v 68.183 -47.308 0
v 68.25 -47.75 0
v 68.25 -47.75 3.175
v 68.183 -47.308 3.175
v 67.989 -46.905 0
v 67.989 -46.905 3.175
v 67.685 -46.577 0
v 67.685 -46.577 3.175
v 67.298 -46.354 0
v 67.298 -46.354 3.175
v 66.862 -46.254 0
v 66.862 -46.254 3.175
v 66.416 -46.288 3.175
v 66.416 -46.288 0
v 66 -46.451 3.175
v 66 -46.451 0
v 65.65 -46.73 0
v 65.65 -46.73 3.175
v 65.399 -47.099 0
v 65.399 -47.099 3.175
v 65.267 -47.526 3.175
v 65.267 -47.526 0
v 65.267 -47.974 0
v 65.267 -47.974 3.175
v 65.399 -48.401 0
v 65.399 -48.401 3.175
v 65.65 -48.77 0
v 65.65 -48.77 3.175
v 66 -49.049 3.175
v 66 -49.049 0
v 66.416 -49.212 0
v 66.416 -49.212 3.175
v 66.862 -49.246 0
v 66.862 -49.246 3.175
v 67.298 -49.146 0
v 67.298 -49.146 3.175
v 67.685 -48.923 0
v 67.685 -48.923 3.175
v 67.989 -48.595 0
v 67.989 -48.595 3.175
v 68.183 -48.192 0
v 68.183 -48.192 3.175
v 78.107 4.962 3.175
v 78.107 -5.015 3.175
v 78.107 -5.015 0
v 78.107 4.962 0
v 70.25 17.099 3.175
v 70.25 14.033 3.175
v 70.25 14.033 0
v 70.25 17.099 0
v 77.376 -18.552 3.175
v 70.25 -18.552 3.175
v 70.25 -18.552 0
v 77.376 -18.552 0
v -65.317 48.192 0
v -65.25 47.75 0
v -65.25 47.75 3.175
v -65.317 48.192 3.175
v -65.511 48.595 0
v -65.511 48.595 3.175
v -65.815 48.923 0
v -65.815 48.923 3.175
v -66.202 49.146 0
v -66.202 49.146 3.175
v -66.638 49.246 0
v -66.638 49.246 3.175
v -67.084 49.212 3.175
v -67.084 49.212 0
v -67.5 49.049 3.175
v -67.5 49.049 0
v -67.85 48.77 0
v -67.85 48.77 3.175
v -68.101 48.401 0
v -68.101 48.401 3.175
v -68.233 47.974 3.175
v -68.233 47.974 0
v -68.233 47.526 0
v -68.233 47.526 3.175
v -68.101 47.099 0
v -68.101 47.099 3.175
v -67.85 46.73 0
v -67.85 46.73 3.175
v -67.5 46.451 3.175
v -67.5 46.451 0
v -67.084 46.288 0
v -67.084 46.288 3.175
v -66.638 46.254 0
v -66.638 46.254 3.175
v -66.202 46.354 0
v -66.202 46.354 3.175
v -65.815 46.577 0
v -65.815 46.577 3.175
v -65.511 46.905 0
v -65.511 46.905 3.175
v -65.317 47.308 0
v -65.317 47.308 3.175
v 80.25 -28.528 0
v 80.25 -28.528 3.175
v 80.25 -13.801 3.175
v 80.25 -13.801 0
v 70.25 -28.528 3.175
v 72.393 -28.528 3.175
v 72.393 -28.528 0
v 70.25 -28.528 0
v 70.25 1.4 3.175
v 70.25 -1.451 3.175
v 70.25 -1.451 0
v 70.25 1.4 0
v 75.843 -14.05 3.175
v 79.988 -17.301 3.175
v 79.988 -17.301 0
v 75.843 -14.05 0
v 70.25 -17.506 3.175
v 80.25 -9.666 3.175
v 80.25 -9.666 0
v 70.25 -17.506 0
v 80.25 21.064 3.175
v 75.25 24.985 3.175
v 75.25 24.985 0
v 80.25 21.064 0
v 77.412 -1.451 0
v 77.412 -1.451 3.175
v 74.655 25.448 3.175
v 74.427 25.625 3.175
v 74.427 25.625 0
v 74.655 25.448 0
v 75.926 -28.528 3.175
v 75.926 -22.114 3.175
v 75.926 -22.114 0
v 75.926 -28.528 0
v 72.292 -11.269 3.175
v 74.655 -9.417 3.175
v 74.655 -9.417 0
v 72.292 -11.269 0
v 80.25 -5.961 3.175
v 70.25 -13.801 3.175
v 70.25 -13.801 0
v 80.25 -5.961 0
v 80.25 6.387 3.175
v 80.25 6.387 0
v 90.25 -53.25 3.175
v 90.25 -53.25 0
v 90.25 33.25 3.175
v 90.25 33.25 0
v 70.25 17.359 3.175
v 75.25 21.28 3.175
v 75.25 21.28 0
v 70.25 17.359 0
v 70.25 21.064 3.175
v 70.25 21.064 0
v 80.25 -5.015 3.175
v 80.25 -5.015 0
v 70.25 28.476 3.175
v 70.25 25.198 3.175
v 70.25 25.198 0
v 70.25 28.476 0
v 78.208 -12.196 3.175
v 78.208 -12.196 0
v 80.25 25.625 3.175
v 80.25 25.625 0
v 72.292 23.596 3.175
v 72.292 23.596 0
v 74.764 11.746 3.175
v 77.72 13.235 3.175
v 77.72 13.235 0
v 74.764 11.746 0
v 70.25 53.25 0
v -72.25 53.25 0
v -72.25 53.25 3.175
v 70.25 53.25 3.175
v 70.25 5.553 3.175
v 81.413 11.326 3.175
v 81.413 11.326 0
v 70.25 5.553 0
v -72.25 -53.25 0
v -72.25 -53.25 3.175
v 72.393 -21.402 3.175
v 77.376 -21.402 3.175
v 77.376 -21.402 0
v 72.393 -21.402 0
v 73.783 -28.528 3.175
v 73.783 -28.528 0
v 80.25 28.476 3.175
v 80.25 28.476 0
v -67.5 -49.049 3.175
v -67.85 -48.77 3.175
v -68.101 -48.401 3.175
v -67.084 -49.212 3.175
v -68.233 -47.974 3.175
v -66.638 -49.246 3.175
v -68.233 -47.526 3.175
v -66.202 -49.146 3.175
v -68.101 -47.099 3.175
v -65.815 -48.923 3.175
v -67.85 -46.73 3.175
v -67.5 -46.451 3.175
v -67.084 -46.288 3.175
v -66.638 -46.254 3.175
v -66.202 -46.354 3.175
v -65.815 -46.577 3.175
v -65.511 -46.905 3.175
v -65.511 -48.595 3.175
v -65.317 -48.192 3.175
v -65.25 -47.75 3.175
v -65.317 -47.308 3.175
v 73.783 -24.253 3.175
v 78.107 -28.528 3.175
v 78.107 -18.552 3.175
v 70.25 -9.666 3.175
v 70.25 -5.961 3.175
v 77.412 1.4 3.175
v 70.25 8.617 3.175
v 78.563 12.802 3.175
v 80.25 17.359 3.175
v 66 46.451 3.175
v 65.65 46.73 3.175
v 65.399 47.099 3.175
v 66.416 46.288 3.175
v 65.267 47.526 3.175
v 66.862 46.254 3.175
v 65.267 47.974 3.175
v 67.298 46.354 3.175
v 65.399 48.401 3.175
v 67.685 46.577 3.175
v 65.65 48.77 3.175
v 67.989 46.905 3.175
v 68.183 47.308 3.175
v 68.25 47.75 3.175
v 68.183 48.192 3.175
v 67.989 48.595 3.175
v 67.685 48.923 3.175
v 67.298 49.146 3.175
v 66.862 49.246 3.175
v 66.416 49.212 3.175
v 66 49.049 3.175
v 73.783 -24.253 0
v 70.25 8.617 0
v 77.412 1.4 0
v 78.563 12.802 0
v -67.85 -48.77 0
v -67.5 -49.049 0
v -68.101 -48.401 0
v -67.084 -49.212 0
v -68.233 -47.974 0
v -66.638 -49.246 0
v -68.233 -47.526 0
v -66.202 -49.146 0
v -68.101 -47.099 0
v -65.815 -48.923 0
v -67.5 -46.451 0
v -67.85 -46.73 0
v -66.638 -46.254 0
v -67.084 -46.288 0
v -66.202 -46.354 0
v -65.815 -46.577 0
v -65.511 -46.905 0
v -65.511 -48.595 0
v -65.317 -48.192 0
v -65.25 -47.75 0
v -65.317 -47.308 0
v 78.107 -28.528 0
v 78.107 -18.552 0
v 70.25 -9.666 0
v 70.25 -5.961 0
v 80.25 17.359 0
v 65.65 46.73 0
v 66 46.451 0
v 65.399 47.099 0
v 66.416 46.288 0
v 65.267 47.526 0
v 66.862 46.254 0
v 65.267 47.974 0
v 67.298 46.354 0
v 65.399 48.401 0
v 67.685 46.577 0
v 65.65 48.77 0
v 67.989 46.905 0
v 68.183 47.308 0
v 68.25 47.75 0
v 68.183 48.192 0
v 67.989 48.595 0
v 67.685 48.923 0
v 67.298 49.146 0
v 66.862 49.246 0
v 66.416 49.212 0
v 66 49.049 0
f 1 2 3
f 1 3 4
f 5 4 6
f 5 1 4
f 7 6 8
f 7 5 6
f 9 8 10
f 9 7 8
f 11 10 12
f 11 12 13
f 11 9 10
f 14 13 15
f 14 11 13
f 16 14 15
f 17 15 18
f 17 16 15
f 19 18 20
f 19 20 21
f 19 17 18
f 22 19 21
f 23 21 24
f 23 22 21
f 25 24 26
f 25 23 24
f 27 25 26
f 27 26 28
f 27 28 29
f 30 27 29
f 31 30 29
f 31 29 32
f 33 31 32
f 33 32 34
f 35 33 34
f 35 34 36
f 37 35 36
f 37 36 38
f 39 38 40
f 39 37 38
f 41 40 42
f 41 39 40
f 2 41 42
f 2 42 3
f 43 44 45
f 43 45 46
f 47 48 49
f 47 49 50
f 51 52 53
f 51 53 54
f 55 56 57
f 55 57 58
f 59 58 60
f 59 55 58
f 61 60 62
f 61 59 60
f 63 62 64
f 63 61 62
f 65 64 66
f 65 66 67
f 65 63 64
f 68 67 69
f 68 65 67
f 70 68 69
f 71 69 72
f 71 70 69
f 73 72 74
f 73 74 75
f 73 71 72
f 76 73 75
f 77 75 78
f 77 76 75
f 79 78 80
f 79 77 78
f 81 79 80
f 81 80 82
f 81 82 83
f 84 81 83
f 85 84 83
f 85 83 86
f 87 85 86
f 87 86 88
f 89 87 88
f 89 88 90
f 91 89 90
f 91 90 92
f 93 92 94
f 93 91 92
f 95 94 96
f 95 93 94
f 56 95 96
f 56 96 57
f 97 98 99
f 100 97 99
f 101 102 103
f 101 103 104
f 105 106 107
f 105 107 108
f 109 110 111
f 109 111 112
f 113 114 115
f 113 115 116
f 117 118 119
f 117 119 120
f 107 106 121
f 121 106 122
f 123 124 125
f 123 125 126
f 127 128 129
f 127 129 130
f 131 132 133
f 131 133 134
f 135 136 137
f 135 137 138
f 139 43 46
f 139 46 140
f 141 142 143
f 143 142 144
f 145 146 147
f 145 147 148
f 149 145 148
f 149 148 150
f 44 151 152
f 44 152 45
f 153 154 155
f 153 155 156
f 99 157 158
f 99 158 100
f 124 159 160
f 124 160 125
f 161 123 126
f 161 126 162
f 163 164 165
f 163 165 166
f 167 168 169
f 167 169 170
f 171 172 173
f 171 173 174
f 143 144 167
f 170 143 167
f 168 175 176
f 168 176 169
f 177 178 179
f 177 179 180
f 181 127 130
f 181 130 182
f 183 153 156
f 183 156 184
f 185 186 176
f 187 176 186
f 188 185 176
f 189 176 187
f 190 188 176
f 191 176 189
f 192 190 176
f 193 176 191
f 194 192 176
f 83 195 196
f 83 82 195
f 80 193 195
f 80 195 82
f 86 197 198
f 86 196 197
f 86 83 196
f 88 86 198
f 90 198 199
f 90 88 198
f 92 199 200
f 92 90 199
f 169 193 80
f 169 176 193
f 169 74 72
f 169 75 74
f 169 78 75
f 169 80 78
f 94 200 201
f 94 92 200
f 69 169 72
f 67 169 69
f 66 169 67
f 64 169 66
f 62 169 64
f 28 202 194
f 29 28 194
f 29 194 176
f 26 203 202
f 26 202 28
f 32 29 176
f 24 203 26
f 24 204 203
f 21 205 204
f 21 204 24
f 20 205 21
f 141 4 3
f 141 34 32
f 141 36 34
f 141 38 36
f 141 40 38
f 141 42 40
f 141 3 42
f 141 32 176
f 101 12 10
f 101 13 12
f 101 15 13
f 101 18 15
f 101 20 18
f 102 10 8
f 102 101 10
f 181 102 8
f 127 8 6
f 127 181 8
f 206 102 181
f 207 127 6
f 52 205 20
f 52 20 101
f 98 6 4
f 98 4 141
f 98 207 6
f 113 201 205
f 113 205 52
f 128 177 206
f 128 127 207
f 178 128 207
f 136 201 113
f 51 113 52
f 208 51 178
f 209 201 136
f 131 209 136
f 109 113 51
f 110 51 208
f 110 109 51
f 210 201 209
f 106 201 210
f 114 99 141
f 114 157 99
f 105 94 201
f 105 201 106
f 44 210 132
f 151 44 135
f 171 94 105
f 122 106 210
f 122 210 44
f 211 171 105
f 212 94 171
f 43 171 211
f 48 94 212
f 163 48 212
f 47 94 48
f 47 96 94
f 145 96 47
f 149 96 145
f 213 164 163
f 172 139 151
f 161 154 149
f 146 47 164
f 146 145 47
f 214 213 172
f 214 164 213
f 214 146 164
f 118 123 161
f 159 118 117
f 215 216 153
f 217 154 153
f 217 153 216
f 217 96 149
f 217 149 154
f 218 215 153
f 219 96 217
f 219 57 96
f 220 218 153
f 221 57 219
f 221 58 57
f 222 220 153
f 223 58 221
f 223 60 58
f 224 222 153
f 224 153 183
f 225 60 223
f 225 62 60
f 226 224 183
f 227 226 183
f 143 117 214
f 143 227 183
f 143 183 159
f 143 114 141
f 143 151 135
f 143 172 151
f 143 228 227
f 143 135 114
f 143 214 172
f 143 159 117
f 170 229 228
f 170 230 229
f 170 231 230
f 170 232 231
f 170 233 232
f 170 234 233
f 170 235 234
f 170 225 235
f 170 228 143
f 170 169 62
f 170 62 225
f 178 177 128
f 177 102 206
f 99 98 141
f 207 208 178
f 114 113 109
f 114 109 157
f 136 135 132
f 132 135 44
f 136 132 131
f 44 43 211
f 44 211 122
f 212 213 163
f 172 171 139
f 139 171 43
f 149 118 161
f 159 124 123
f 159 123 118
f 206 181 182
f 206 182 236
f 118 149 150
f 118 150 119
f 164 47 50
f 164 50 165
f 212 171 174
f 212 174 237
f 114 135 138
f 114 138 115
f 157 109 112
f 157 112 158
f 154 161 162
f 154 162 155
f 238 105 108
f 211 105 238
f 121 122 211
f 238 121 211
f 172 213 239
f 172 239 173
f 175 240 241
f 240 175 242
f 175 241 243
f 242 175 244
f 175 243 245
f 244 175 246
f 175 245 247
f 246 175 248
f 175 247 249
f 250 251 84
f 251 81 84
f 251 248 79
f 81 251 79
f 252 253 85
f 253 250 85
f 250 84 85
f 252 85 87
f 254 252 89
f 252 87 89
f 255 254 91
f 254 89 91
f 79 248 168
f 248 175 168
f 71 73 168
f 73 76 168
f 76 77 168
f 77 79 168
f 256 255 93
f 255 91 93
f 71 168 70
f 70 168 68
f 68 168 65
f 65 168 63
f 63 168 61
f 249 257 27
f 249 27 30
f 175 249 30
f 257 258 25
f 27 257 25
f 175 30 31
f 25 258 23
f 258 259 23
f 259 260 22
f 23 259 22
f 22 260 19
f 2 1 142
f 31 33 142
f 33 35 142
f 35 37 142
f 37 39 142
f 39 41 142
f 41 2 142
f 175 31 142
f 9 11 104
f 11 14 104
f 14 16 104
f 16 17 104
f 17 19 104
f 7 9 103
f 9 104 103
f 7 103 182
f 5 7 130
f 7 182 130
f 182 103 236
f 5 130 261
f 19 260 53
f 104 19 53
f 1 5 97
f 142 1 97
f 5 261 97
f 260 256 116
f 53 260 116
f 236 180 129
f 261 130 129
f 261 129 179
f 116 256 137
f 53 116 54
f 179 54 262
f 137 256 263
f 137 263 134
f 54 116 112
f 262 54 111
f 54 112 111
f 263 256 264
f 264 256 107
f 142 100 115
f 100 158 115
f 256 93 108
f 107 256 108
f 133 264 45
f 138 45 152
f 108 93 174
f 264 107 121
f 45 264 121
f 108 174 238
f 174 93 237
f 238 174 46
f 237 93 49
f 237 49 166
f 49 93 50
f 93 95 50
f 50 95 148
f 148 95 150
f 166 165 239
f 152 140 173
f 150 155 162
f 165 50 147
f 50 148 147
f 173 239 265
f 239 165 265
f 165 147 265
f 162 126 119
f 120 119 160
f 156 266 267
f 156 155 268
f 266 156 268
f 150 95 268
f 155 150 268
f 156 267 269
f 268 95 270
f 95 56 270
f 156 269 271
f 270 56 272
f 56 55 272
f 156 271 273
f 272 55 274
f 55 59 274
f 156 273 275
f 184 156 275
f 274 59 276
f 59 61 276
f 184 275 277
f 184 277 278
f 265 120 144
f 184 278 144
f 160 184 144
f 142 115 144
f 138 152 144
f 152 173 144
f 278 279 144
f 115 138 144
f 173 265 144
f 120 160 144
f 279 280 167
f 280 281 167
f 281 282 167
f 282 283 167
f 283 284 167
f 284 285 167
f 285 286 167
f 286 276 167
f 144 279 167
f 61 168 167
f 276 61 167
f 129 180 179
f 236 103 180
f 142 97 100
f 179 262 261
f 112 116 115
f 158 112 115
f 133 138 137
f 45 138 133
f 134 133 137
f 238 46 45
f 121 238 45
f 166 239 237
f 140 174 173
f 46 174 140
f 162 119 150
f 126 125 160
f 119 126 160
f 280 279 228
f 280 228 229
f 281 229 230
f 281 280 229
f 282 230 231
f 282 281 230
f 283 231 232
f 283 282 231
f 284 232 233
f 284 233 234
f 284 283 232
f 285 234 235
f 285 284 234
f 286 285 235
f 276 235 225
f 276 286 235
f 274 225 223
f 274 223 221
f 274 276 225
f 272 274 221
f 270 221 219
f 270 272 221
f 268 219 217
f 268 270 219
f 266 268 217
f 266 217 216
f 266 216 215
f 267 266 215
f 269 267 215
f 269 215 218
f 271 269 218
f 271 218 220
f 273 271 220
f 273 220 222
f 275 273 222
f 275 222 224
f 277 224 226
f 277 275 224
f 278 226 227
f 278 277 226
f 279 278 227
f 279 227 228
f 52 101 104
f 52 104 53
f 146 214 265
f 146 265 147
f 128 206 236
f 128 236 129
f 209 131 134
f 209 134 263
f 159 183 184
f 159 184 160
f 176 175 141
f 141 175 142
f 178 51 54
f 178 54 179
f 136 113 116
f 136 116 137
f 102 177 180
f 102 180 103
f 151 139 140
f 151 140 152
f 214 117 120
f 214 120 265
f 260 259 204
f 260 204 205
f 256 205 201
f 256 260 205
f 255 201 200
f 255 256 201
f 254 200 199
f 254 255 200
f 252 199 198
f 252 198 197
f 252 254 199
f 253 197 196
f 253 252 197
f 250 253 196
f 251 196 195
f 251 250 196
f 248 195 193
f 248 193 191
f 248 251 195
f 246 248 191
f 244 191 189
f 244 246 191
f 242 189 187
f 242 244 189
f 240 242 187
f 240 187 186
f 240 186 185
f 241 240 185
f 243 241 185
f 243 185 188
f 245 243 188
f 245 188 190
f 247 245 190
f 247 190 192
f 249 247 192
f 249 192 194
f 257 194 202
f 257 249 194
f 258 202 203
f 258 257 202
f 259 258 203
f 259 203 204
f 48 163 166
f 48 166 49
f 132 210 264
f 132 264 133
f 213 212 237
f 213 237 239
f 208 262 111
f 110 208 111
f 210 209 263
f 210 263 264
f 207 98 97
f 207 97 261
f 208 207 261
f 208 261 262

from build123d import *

# Parameters (mm, degrees)
SKETCH1_W           = 140.5
SKETCH1_H           = 106.5
SKETCH1_R           = 1.5
SKETCH1_W_2         = 2
BOSS_EXTRUDE1_DEPTH = 3.175
BOSS_EXTRUDE2_DEPTH = 3.175
SKETCH3_W           = 7.162162162
SKETCH3_H           = 2.850506757
CUT_EXTRUDE1_DEPTH  = 3.175


with BuildPart() as part:
    # Sketch1 → Boss-Extrude1 (new body)
    # profile 1 of 2: a face of its own
    with BuildSketch(Plane.XY):
        Rectangle(SKETCH1_W, SKETCH1_H)
        with Locations((-66.75, -47.75)):
            Circle(SKETCH1_R, mode=Mode.SUBTRACT)
        with Locations((66.75, -47.75)):
            Circle(SKETCH1_R, mode=Mode.SUBTRACT)
        with Locations((-66.75, 47.75)):
            Circle(SKETCH1_R, mode=Mode.SUBTRACT)
        with Locations((66.75, 47.75)):
            Circle(SKETCH1_R, mode=Mode.SUBTRACT)
    # profile 2 of 2: a face of its own
    with BuildSketch(Plane.XY):
        with Locations((-71.25, 0)):
            Rectangle(SKETCH1_W_2, SKETCH1_H)
    extrude(amount=BOSS_EXTRUDE1_DEPTH)

    # Sketch2 → Boss-Extrude2 (add)
    with BuildSketch(Plane.XY):
        Polygon((90.25, 33.25), (70.25, 53.25), (70.25, -53.25), (90.25, -53.25), align=None)
    extrude(amount=BOSS_EXTRUDE2_DEPTH)

    # Sketch3 → Cut-Extrude1 (cut)
    with BuildSketch(Plane.XY.offset(3.175)):
        Polygon((75.25, 21.279560811), (70.25, 17.358530405), (70.25, 21.064189189), (75.25, 24.985219595), (80.25, 21.064189189), (80.25, 17.358530405), align=None)
        Polygon((80.25, 28.475506757), (80.25, 25.625), (74.42652027, 25.625), (74.654560811, 25.447635135), (72.291807432, 23.595861486), (70.25, 25.19847973), (70.25, 28.475506757), align=None)
        Polygon((78.562922297, 12.801942568), (81.413429054, 11.326013514), (70.25, 5.553209459), (70.25, 8.616976351), align=None)
        Polygon((74.764358108, 11.746199324), (70.25, 14.032939189), (70.25, 17.098817568), (77.720439189, 13.234797297), align=None)
        Polygon((78.106841216, -5.014780405), (78.106841216, 4.961993243), (80.25, 6.387246622), (80.25, -5.014780405), align=None)
        with Locations((73.831081081, -0.025337837)):
            Rectangle(SKETCH3_W, SKETCH3_H)
        Polygon((70.25, -17.506334459), (70.25, -13.800675676), (80.25, -5.960726351), (80.25, -9.666385135), align=None)
        Polygon((78.208192568, -12.195945946), (80.25, -13.800675676), (80.25, -17.506334459), (75.843327703, -14.049831081), align=None)
        Polygon((72.291807432, -11.269003378), (70.25, -9.666385135), (70.25, -5.960726351), (74.654560811, -9.41722973), align=None)
        Polygon((78.106841216, -28.528293919), (78.106841216, -18.55152027), (80.25, -17.126266892), (80.25, -28.528293919), align=None)
        Polygon((77.376266892, -18.55152027), (77.376266892, -21.402027027), (72.393158784, -21.402027027), (72.393158784, -28.528293919), (70.25, -28.528293919), (70.25, -18.55152027), align=None)
        Polygon((73.782516892, -28.528293919), (73.782516892, -24.252533784), (75.925675676, -22.113597973), (75.925675676, -28.528293919), align=None)
    extrude(amount=-CUT_EXTRUDE1_DEPTH, mode=Mode.SUBTRACT)


solid = part.part
